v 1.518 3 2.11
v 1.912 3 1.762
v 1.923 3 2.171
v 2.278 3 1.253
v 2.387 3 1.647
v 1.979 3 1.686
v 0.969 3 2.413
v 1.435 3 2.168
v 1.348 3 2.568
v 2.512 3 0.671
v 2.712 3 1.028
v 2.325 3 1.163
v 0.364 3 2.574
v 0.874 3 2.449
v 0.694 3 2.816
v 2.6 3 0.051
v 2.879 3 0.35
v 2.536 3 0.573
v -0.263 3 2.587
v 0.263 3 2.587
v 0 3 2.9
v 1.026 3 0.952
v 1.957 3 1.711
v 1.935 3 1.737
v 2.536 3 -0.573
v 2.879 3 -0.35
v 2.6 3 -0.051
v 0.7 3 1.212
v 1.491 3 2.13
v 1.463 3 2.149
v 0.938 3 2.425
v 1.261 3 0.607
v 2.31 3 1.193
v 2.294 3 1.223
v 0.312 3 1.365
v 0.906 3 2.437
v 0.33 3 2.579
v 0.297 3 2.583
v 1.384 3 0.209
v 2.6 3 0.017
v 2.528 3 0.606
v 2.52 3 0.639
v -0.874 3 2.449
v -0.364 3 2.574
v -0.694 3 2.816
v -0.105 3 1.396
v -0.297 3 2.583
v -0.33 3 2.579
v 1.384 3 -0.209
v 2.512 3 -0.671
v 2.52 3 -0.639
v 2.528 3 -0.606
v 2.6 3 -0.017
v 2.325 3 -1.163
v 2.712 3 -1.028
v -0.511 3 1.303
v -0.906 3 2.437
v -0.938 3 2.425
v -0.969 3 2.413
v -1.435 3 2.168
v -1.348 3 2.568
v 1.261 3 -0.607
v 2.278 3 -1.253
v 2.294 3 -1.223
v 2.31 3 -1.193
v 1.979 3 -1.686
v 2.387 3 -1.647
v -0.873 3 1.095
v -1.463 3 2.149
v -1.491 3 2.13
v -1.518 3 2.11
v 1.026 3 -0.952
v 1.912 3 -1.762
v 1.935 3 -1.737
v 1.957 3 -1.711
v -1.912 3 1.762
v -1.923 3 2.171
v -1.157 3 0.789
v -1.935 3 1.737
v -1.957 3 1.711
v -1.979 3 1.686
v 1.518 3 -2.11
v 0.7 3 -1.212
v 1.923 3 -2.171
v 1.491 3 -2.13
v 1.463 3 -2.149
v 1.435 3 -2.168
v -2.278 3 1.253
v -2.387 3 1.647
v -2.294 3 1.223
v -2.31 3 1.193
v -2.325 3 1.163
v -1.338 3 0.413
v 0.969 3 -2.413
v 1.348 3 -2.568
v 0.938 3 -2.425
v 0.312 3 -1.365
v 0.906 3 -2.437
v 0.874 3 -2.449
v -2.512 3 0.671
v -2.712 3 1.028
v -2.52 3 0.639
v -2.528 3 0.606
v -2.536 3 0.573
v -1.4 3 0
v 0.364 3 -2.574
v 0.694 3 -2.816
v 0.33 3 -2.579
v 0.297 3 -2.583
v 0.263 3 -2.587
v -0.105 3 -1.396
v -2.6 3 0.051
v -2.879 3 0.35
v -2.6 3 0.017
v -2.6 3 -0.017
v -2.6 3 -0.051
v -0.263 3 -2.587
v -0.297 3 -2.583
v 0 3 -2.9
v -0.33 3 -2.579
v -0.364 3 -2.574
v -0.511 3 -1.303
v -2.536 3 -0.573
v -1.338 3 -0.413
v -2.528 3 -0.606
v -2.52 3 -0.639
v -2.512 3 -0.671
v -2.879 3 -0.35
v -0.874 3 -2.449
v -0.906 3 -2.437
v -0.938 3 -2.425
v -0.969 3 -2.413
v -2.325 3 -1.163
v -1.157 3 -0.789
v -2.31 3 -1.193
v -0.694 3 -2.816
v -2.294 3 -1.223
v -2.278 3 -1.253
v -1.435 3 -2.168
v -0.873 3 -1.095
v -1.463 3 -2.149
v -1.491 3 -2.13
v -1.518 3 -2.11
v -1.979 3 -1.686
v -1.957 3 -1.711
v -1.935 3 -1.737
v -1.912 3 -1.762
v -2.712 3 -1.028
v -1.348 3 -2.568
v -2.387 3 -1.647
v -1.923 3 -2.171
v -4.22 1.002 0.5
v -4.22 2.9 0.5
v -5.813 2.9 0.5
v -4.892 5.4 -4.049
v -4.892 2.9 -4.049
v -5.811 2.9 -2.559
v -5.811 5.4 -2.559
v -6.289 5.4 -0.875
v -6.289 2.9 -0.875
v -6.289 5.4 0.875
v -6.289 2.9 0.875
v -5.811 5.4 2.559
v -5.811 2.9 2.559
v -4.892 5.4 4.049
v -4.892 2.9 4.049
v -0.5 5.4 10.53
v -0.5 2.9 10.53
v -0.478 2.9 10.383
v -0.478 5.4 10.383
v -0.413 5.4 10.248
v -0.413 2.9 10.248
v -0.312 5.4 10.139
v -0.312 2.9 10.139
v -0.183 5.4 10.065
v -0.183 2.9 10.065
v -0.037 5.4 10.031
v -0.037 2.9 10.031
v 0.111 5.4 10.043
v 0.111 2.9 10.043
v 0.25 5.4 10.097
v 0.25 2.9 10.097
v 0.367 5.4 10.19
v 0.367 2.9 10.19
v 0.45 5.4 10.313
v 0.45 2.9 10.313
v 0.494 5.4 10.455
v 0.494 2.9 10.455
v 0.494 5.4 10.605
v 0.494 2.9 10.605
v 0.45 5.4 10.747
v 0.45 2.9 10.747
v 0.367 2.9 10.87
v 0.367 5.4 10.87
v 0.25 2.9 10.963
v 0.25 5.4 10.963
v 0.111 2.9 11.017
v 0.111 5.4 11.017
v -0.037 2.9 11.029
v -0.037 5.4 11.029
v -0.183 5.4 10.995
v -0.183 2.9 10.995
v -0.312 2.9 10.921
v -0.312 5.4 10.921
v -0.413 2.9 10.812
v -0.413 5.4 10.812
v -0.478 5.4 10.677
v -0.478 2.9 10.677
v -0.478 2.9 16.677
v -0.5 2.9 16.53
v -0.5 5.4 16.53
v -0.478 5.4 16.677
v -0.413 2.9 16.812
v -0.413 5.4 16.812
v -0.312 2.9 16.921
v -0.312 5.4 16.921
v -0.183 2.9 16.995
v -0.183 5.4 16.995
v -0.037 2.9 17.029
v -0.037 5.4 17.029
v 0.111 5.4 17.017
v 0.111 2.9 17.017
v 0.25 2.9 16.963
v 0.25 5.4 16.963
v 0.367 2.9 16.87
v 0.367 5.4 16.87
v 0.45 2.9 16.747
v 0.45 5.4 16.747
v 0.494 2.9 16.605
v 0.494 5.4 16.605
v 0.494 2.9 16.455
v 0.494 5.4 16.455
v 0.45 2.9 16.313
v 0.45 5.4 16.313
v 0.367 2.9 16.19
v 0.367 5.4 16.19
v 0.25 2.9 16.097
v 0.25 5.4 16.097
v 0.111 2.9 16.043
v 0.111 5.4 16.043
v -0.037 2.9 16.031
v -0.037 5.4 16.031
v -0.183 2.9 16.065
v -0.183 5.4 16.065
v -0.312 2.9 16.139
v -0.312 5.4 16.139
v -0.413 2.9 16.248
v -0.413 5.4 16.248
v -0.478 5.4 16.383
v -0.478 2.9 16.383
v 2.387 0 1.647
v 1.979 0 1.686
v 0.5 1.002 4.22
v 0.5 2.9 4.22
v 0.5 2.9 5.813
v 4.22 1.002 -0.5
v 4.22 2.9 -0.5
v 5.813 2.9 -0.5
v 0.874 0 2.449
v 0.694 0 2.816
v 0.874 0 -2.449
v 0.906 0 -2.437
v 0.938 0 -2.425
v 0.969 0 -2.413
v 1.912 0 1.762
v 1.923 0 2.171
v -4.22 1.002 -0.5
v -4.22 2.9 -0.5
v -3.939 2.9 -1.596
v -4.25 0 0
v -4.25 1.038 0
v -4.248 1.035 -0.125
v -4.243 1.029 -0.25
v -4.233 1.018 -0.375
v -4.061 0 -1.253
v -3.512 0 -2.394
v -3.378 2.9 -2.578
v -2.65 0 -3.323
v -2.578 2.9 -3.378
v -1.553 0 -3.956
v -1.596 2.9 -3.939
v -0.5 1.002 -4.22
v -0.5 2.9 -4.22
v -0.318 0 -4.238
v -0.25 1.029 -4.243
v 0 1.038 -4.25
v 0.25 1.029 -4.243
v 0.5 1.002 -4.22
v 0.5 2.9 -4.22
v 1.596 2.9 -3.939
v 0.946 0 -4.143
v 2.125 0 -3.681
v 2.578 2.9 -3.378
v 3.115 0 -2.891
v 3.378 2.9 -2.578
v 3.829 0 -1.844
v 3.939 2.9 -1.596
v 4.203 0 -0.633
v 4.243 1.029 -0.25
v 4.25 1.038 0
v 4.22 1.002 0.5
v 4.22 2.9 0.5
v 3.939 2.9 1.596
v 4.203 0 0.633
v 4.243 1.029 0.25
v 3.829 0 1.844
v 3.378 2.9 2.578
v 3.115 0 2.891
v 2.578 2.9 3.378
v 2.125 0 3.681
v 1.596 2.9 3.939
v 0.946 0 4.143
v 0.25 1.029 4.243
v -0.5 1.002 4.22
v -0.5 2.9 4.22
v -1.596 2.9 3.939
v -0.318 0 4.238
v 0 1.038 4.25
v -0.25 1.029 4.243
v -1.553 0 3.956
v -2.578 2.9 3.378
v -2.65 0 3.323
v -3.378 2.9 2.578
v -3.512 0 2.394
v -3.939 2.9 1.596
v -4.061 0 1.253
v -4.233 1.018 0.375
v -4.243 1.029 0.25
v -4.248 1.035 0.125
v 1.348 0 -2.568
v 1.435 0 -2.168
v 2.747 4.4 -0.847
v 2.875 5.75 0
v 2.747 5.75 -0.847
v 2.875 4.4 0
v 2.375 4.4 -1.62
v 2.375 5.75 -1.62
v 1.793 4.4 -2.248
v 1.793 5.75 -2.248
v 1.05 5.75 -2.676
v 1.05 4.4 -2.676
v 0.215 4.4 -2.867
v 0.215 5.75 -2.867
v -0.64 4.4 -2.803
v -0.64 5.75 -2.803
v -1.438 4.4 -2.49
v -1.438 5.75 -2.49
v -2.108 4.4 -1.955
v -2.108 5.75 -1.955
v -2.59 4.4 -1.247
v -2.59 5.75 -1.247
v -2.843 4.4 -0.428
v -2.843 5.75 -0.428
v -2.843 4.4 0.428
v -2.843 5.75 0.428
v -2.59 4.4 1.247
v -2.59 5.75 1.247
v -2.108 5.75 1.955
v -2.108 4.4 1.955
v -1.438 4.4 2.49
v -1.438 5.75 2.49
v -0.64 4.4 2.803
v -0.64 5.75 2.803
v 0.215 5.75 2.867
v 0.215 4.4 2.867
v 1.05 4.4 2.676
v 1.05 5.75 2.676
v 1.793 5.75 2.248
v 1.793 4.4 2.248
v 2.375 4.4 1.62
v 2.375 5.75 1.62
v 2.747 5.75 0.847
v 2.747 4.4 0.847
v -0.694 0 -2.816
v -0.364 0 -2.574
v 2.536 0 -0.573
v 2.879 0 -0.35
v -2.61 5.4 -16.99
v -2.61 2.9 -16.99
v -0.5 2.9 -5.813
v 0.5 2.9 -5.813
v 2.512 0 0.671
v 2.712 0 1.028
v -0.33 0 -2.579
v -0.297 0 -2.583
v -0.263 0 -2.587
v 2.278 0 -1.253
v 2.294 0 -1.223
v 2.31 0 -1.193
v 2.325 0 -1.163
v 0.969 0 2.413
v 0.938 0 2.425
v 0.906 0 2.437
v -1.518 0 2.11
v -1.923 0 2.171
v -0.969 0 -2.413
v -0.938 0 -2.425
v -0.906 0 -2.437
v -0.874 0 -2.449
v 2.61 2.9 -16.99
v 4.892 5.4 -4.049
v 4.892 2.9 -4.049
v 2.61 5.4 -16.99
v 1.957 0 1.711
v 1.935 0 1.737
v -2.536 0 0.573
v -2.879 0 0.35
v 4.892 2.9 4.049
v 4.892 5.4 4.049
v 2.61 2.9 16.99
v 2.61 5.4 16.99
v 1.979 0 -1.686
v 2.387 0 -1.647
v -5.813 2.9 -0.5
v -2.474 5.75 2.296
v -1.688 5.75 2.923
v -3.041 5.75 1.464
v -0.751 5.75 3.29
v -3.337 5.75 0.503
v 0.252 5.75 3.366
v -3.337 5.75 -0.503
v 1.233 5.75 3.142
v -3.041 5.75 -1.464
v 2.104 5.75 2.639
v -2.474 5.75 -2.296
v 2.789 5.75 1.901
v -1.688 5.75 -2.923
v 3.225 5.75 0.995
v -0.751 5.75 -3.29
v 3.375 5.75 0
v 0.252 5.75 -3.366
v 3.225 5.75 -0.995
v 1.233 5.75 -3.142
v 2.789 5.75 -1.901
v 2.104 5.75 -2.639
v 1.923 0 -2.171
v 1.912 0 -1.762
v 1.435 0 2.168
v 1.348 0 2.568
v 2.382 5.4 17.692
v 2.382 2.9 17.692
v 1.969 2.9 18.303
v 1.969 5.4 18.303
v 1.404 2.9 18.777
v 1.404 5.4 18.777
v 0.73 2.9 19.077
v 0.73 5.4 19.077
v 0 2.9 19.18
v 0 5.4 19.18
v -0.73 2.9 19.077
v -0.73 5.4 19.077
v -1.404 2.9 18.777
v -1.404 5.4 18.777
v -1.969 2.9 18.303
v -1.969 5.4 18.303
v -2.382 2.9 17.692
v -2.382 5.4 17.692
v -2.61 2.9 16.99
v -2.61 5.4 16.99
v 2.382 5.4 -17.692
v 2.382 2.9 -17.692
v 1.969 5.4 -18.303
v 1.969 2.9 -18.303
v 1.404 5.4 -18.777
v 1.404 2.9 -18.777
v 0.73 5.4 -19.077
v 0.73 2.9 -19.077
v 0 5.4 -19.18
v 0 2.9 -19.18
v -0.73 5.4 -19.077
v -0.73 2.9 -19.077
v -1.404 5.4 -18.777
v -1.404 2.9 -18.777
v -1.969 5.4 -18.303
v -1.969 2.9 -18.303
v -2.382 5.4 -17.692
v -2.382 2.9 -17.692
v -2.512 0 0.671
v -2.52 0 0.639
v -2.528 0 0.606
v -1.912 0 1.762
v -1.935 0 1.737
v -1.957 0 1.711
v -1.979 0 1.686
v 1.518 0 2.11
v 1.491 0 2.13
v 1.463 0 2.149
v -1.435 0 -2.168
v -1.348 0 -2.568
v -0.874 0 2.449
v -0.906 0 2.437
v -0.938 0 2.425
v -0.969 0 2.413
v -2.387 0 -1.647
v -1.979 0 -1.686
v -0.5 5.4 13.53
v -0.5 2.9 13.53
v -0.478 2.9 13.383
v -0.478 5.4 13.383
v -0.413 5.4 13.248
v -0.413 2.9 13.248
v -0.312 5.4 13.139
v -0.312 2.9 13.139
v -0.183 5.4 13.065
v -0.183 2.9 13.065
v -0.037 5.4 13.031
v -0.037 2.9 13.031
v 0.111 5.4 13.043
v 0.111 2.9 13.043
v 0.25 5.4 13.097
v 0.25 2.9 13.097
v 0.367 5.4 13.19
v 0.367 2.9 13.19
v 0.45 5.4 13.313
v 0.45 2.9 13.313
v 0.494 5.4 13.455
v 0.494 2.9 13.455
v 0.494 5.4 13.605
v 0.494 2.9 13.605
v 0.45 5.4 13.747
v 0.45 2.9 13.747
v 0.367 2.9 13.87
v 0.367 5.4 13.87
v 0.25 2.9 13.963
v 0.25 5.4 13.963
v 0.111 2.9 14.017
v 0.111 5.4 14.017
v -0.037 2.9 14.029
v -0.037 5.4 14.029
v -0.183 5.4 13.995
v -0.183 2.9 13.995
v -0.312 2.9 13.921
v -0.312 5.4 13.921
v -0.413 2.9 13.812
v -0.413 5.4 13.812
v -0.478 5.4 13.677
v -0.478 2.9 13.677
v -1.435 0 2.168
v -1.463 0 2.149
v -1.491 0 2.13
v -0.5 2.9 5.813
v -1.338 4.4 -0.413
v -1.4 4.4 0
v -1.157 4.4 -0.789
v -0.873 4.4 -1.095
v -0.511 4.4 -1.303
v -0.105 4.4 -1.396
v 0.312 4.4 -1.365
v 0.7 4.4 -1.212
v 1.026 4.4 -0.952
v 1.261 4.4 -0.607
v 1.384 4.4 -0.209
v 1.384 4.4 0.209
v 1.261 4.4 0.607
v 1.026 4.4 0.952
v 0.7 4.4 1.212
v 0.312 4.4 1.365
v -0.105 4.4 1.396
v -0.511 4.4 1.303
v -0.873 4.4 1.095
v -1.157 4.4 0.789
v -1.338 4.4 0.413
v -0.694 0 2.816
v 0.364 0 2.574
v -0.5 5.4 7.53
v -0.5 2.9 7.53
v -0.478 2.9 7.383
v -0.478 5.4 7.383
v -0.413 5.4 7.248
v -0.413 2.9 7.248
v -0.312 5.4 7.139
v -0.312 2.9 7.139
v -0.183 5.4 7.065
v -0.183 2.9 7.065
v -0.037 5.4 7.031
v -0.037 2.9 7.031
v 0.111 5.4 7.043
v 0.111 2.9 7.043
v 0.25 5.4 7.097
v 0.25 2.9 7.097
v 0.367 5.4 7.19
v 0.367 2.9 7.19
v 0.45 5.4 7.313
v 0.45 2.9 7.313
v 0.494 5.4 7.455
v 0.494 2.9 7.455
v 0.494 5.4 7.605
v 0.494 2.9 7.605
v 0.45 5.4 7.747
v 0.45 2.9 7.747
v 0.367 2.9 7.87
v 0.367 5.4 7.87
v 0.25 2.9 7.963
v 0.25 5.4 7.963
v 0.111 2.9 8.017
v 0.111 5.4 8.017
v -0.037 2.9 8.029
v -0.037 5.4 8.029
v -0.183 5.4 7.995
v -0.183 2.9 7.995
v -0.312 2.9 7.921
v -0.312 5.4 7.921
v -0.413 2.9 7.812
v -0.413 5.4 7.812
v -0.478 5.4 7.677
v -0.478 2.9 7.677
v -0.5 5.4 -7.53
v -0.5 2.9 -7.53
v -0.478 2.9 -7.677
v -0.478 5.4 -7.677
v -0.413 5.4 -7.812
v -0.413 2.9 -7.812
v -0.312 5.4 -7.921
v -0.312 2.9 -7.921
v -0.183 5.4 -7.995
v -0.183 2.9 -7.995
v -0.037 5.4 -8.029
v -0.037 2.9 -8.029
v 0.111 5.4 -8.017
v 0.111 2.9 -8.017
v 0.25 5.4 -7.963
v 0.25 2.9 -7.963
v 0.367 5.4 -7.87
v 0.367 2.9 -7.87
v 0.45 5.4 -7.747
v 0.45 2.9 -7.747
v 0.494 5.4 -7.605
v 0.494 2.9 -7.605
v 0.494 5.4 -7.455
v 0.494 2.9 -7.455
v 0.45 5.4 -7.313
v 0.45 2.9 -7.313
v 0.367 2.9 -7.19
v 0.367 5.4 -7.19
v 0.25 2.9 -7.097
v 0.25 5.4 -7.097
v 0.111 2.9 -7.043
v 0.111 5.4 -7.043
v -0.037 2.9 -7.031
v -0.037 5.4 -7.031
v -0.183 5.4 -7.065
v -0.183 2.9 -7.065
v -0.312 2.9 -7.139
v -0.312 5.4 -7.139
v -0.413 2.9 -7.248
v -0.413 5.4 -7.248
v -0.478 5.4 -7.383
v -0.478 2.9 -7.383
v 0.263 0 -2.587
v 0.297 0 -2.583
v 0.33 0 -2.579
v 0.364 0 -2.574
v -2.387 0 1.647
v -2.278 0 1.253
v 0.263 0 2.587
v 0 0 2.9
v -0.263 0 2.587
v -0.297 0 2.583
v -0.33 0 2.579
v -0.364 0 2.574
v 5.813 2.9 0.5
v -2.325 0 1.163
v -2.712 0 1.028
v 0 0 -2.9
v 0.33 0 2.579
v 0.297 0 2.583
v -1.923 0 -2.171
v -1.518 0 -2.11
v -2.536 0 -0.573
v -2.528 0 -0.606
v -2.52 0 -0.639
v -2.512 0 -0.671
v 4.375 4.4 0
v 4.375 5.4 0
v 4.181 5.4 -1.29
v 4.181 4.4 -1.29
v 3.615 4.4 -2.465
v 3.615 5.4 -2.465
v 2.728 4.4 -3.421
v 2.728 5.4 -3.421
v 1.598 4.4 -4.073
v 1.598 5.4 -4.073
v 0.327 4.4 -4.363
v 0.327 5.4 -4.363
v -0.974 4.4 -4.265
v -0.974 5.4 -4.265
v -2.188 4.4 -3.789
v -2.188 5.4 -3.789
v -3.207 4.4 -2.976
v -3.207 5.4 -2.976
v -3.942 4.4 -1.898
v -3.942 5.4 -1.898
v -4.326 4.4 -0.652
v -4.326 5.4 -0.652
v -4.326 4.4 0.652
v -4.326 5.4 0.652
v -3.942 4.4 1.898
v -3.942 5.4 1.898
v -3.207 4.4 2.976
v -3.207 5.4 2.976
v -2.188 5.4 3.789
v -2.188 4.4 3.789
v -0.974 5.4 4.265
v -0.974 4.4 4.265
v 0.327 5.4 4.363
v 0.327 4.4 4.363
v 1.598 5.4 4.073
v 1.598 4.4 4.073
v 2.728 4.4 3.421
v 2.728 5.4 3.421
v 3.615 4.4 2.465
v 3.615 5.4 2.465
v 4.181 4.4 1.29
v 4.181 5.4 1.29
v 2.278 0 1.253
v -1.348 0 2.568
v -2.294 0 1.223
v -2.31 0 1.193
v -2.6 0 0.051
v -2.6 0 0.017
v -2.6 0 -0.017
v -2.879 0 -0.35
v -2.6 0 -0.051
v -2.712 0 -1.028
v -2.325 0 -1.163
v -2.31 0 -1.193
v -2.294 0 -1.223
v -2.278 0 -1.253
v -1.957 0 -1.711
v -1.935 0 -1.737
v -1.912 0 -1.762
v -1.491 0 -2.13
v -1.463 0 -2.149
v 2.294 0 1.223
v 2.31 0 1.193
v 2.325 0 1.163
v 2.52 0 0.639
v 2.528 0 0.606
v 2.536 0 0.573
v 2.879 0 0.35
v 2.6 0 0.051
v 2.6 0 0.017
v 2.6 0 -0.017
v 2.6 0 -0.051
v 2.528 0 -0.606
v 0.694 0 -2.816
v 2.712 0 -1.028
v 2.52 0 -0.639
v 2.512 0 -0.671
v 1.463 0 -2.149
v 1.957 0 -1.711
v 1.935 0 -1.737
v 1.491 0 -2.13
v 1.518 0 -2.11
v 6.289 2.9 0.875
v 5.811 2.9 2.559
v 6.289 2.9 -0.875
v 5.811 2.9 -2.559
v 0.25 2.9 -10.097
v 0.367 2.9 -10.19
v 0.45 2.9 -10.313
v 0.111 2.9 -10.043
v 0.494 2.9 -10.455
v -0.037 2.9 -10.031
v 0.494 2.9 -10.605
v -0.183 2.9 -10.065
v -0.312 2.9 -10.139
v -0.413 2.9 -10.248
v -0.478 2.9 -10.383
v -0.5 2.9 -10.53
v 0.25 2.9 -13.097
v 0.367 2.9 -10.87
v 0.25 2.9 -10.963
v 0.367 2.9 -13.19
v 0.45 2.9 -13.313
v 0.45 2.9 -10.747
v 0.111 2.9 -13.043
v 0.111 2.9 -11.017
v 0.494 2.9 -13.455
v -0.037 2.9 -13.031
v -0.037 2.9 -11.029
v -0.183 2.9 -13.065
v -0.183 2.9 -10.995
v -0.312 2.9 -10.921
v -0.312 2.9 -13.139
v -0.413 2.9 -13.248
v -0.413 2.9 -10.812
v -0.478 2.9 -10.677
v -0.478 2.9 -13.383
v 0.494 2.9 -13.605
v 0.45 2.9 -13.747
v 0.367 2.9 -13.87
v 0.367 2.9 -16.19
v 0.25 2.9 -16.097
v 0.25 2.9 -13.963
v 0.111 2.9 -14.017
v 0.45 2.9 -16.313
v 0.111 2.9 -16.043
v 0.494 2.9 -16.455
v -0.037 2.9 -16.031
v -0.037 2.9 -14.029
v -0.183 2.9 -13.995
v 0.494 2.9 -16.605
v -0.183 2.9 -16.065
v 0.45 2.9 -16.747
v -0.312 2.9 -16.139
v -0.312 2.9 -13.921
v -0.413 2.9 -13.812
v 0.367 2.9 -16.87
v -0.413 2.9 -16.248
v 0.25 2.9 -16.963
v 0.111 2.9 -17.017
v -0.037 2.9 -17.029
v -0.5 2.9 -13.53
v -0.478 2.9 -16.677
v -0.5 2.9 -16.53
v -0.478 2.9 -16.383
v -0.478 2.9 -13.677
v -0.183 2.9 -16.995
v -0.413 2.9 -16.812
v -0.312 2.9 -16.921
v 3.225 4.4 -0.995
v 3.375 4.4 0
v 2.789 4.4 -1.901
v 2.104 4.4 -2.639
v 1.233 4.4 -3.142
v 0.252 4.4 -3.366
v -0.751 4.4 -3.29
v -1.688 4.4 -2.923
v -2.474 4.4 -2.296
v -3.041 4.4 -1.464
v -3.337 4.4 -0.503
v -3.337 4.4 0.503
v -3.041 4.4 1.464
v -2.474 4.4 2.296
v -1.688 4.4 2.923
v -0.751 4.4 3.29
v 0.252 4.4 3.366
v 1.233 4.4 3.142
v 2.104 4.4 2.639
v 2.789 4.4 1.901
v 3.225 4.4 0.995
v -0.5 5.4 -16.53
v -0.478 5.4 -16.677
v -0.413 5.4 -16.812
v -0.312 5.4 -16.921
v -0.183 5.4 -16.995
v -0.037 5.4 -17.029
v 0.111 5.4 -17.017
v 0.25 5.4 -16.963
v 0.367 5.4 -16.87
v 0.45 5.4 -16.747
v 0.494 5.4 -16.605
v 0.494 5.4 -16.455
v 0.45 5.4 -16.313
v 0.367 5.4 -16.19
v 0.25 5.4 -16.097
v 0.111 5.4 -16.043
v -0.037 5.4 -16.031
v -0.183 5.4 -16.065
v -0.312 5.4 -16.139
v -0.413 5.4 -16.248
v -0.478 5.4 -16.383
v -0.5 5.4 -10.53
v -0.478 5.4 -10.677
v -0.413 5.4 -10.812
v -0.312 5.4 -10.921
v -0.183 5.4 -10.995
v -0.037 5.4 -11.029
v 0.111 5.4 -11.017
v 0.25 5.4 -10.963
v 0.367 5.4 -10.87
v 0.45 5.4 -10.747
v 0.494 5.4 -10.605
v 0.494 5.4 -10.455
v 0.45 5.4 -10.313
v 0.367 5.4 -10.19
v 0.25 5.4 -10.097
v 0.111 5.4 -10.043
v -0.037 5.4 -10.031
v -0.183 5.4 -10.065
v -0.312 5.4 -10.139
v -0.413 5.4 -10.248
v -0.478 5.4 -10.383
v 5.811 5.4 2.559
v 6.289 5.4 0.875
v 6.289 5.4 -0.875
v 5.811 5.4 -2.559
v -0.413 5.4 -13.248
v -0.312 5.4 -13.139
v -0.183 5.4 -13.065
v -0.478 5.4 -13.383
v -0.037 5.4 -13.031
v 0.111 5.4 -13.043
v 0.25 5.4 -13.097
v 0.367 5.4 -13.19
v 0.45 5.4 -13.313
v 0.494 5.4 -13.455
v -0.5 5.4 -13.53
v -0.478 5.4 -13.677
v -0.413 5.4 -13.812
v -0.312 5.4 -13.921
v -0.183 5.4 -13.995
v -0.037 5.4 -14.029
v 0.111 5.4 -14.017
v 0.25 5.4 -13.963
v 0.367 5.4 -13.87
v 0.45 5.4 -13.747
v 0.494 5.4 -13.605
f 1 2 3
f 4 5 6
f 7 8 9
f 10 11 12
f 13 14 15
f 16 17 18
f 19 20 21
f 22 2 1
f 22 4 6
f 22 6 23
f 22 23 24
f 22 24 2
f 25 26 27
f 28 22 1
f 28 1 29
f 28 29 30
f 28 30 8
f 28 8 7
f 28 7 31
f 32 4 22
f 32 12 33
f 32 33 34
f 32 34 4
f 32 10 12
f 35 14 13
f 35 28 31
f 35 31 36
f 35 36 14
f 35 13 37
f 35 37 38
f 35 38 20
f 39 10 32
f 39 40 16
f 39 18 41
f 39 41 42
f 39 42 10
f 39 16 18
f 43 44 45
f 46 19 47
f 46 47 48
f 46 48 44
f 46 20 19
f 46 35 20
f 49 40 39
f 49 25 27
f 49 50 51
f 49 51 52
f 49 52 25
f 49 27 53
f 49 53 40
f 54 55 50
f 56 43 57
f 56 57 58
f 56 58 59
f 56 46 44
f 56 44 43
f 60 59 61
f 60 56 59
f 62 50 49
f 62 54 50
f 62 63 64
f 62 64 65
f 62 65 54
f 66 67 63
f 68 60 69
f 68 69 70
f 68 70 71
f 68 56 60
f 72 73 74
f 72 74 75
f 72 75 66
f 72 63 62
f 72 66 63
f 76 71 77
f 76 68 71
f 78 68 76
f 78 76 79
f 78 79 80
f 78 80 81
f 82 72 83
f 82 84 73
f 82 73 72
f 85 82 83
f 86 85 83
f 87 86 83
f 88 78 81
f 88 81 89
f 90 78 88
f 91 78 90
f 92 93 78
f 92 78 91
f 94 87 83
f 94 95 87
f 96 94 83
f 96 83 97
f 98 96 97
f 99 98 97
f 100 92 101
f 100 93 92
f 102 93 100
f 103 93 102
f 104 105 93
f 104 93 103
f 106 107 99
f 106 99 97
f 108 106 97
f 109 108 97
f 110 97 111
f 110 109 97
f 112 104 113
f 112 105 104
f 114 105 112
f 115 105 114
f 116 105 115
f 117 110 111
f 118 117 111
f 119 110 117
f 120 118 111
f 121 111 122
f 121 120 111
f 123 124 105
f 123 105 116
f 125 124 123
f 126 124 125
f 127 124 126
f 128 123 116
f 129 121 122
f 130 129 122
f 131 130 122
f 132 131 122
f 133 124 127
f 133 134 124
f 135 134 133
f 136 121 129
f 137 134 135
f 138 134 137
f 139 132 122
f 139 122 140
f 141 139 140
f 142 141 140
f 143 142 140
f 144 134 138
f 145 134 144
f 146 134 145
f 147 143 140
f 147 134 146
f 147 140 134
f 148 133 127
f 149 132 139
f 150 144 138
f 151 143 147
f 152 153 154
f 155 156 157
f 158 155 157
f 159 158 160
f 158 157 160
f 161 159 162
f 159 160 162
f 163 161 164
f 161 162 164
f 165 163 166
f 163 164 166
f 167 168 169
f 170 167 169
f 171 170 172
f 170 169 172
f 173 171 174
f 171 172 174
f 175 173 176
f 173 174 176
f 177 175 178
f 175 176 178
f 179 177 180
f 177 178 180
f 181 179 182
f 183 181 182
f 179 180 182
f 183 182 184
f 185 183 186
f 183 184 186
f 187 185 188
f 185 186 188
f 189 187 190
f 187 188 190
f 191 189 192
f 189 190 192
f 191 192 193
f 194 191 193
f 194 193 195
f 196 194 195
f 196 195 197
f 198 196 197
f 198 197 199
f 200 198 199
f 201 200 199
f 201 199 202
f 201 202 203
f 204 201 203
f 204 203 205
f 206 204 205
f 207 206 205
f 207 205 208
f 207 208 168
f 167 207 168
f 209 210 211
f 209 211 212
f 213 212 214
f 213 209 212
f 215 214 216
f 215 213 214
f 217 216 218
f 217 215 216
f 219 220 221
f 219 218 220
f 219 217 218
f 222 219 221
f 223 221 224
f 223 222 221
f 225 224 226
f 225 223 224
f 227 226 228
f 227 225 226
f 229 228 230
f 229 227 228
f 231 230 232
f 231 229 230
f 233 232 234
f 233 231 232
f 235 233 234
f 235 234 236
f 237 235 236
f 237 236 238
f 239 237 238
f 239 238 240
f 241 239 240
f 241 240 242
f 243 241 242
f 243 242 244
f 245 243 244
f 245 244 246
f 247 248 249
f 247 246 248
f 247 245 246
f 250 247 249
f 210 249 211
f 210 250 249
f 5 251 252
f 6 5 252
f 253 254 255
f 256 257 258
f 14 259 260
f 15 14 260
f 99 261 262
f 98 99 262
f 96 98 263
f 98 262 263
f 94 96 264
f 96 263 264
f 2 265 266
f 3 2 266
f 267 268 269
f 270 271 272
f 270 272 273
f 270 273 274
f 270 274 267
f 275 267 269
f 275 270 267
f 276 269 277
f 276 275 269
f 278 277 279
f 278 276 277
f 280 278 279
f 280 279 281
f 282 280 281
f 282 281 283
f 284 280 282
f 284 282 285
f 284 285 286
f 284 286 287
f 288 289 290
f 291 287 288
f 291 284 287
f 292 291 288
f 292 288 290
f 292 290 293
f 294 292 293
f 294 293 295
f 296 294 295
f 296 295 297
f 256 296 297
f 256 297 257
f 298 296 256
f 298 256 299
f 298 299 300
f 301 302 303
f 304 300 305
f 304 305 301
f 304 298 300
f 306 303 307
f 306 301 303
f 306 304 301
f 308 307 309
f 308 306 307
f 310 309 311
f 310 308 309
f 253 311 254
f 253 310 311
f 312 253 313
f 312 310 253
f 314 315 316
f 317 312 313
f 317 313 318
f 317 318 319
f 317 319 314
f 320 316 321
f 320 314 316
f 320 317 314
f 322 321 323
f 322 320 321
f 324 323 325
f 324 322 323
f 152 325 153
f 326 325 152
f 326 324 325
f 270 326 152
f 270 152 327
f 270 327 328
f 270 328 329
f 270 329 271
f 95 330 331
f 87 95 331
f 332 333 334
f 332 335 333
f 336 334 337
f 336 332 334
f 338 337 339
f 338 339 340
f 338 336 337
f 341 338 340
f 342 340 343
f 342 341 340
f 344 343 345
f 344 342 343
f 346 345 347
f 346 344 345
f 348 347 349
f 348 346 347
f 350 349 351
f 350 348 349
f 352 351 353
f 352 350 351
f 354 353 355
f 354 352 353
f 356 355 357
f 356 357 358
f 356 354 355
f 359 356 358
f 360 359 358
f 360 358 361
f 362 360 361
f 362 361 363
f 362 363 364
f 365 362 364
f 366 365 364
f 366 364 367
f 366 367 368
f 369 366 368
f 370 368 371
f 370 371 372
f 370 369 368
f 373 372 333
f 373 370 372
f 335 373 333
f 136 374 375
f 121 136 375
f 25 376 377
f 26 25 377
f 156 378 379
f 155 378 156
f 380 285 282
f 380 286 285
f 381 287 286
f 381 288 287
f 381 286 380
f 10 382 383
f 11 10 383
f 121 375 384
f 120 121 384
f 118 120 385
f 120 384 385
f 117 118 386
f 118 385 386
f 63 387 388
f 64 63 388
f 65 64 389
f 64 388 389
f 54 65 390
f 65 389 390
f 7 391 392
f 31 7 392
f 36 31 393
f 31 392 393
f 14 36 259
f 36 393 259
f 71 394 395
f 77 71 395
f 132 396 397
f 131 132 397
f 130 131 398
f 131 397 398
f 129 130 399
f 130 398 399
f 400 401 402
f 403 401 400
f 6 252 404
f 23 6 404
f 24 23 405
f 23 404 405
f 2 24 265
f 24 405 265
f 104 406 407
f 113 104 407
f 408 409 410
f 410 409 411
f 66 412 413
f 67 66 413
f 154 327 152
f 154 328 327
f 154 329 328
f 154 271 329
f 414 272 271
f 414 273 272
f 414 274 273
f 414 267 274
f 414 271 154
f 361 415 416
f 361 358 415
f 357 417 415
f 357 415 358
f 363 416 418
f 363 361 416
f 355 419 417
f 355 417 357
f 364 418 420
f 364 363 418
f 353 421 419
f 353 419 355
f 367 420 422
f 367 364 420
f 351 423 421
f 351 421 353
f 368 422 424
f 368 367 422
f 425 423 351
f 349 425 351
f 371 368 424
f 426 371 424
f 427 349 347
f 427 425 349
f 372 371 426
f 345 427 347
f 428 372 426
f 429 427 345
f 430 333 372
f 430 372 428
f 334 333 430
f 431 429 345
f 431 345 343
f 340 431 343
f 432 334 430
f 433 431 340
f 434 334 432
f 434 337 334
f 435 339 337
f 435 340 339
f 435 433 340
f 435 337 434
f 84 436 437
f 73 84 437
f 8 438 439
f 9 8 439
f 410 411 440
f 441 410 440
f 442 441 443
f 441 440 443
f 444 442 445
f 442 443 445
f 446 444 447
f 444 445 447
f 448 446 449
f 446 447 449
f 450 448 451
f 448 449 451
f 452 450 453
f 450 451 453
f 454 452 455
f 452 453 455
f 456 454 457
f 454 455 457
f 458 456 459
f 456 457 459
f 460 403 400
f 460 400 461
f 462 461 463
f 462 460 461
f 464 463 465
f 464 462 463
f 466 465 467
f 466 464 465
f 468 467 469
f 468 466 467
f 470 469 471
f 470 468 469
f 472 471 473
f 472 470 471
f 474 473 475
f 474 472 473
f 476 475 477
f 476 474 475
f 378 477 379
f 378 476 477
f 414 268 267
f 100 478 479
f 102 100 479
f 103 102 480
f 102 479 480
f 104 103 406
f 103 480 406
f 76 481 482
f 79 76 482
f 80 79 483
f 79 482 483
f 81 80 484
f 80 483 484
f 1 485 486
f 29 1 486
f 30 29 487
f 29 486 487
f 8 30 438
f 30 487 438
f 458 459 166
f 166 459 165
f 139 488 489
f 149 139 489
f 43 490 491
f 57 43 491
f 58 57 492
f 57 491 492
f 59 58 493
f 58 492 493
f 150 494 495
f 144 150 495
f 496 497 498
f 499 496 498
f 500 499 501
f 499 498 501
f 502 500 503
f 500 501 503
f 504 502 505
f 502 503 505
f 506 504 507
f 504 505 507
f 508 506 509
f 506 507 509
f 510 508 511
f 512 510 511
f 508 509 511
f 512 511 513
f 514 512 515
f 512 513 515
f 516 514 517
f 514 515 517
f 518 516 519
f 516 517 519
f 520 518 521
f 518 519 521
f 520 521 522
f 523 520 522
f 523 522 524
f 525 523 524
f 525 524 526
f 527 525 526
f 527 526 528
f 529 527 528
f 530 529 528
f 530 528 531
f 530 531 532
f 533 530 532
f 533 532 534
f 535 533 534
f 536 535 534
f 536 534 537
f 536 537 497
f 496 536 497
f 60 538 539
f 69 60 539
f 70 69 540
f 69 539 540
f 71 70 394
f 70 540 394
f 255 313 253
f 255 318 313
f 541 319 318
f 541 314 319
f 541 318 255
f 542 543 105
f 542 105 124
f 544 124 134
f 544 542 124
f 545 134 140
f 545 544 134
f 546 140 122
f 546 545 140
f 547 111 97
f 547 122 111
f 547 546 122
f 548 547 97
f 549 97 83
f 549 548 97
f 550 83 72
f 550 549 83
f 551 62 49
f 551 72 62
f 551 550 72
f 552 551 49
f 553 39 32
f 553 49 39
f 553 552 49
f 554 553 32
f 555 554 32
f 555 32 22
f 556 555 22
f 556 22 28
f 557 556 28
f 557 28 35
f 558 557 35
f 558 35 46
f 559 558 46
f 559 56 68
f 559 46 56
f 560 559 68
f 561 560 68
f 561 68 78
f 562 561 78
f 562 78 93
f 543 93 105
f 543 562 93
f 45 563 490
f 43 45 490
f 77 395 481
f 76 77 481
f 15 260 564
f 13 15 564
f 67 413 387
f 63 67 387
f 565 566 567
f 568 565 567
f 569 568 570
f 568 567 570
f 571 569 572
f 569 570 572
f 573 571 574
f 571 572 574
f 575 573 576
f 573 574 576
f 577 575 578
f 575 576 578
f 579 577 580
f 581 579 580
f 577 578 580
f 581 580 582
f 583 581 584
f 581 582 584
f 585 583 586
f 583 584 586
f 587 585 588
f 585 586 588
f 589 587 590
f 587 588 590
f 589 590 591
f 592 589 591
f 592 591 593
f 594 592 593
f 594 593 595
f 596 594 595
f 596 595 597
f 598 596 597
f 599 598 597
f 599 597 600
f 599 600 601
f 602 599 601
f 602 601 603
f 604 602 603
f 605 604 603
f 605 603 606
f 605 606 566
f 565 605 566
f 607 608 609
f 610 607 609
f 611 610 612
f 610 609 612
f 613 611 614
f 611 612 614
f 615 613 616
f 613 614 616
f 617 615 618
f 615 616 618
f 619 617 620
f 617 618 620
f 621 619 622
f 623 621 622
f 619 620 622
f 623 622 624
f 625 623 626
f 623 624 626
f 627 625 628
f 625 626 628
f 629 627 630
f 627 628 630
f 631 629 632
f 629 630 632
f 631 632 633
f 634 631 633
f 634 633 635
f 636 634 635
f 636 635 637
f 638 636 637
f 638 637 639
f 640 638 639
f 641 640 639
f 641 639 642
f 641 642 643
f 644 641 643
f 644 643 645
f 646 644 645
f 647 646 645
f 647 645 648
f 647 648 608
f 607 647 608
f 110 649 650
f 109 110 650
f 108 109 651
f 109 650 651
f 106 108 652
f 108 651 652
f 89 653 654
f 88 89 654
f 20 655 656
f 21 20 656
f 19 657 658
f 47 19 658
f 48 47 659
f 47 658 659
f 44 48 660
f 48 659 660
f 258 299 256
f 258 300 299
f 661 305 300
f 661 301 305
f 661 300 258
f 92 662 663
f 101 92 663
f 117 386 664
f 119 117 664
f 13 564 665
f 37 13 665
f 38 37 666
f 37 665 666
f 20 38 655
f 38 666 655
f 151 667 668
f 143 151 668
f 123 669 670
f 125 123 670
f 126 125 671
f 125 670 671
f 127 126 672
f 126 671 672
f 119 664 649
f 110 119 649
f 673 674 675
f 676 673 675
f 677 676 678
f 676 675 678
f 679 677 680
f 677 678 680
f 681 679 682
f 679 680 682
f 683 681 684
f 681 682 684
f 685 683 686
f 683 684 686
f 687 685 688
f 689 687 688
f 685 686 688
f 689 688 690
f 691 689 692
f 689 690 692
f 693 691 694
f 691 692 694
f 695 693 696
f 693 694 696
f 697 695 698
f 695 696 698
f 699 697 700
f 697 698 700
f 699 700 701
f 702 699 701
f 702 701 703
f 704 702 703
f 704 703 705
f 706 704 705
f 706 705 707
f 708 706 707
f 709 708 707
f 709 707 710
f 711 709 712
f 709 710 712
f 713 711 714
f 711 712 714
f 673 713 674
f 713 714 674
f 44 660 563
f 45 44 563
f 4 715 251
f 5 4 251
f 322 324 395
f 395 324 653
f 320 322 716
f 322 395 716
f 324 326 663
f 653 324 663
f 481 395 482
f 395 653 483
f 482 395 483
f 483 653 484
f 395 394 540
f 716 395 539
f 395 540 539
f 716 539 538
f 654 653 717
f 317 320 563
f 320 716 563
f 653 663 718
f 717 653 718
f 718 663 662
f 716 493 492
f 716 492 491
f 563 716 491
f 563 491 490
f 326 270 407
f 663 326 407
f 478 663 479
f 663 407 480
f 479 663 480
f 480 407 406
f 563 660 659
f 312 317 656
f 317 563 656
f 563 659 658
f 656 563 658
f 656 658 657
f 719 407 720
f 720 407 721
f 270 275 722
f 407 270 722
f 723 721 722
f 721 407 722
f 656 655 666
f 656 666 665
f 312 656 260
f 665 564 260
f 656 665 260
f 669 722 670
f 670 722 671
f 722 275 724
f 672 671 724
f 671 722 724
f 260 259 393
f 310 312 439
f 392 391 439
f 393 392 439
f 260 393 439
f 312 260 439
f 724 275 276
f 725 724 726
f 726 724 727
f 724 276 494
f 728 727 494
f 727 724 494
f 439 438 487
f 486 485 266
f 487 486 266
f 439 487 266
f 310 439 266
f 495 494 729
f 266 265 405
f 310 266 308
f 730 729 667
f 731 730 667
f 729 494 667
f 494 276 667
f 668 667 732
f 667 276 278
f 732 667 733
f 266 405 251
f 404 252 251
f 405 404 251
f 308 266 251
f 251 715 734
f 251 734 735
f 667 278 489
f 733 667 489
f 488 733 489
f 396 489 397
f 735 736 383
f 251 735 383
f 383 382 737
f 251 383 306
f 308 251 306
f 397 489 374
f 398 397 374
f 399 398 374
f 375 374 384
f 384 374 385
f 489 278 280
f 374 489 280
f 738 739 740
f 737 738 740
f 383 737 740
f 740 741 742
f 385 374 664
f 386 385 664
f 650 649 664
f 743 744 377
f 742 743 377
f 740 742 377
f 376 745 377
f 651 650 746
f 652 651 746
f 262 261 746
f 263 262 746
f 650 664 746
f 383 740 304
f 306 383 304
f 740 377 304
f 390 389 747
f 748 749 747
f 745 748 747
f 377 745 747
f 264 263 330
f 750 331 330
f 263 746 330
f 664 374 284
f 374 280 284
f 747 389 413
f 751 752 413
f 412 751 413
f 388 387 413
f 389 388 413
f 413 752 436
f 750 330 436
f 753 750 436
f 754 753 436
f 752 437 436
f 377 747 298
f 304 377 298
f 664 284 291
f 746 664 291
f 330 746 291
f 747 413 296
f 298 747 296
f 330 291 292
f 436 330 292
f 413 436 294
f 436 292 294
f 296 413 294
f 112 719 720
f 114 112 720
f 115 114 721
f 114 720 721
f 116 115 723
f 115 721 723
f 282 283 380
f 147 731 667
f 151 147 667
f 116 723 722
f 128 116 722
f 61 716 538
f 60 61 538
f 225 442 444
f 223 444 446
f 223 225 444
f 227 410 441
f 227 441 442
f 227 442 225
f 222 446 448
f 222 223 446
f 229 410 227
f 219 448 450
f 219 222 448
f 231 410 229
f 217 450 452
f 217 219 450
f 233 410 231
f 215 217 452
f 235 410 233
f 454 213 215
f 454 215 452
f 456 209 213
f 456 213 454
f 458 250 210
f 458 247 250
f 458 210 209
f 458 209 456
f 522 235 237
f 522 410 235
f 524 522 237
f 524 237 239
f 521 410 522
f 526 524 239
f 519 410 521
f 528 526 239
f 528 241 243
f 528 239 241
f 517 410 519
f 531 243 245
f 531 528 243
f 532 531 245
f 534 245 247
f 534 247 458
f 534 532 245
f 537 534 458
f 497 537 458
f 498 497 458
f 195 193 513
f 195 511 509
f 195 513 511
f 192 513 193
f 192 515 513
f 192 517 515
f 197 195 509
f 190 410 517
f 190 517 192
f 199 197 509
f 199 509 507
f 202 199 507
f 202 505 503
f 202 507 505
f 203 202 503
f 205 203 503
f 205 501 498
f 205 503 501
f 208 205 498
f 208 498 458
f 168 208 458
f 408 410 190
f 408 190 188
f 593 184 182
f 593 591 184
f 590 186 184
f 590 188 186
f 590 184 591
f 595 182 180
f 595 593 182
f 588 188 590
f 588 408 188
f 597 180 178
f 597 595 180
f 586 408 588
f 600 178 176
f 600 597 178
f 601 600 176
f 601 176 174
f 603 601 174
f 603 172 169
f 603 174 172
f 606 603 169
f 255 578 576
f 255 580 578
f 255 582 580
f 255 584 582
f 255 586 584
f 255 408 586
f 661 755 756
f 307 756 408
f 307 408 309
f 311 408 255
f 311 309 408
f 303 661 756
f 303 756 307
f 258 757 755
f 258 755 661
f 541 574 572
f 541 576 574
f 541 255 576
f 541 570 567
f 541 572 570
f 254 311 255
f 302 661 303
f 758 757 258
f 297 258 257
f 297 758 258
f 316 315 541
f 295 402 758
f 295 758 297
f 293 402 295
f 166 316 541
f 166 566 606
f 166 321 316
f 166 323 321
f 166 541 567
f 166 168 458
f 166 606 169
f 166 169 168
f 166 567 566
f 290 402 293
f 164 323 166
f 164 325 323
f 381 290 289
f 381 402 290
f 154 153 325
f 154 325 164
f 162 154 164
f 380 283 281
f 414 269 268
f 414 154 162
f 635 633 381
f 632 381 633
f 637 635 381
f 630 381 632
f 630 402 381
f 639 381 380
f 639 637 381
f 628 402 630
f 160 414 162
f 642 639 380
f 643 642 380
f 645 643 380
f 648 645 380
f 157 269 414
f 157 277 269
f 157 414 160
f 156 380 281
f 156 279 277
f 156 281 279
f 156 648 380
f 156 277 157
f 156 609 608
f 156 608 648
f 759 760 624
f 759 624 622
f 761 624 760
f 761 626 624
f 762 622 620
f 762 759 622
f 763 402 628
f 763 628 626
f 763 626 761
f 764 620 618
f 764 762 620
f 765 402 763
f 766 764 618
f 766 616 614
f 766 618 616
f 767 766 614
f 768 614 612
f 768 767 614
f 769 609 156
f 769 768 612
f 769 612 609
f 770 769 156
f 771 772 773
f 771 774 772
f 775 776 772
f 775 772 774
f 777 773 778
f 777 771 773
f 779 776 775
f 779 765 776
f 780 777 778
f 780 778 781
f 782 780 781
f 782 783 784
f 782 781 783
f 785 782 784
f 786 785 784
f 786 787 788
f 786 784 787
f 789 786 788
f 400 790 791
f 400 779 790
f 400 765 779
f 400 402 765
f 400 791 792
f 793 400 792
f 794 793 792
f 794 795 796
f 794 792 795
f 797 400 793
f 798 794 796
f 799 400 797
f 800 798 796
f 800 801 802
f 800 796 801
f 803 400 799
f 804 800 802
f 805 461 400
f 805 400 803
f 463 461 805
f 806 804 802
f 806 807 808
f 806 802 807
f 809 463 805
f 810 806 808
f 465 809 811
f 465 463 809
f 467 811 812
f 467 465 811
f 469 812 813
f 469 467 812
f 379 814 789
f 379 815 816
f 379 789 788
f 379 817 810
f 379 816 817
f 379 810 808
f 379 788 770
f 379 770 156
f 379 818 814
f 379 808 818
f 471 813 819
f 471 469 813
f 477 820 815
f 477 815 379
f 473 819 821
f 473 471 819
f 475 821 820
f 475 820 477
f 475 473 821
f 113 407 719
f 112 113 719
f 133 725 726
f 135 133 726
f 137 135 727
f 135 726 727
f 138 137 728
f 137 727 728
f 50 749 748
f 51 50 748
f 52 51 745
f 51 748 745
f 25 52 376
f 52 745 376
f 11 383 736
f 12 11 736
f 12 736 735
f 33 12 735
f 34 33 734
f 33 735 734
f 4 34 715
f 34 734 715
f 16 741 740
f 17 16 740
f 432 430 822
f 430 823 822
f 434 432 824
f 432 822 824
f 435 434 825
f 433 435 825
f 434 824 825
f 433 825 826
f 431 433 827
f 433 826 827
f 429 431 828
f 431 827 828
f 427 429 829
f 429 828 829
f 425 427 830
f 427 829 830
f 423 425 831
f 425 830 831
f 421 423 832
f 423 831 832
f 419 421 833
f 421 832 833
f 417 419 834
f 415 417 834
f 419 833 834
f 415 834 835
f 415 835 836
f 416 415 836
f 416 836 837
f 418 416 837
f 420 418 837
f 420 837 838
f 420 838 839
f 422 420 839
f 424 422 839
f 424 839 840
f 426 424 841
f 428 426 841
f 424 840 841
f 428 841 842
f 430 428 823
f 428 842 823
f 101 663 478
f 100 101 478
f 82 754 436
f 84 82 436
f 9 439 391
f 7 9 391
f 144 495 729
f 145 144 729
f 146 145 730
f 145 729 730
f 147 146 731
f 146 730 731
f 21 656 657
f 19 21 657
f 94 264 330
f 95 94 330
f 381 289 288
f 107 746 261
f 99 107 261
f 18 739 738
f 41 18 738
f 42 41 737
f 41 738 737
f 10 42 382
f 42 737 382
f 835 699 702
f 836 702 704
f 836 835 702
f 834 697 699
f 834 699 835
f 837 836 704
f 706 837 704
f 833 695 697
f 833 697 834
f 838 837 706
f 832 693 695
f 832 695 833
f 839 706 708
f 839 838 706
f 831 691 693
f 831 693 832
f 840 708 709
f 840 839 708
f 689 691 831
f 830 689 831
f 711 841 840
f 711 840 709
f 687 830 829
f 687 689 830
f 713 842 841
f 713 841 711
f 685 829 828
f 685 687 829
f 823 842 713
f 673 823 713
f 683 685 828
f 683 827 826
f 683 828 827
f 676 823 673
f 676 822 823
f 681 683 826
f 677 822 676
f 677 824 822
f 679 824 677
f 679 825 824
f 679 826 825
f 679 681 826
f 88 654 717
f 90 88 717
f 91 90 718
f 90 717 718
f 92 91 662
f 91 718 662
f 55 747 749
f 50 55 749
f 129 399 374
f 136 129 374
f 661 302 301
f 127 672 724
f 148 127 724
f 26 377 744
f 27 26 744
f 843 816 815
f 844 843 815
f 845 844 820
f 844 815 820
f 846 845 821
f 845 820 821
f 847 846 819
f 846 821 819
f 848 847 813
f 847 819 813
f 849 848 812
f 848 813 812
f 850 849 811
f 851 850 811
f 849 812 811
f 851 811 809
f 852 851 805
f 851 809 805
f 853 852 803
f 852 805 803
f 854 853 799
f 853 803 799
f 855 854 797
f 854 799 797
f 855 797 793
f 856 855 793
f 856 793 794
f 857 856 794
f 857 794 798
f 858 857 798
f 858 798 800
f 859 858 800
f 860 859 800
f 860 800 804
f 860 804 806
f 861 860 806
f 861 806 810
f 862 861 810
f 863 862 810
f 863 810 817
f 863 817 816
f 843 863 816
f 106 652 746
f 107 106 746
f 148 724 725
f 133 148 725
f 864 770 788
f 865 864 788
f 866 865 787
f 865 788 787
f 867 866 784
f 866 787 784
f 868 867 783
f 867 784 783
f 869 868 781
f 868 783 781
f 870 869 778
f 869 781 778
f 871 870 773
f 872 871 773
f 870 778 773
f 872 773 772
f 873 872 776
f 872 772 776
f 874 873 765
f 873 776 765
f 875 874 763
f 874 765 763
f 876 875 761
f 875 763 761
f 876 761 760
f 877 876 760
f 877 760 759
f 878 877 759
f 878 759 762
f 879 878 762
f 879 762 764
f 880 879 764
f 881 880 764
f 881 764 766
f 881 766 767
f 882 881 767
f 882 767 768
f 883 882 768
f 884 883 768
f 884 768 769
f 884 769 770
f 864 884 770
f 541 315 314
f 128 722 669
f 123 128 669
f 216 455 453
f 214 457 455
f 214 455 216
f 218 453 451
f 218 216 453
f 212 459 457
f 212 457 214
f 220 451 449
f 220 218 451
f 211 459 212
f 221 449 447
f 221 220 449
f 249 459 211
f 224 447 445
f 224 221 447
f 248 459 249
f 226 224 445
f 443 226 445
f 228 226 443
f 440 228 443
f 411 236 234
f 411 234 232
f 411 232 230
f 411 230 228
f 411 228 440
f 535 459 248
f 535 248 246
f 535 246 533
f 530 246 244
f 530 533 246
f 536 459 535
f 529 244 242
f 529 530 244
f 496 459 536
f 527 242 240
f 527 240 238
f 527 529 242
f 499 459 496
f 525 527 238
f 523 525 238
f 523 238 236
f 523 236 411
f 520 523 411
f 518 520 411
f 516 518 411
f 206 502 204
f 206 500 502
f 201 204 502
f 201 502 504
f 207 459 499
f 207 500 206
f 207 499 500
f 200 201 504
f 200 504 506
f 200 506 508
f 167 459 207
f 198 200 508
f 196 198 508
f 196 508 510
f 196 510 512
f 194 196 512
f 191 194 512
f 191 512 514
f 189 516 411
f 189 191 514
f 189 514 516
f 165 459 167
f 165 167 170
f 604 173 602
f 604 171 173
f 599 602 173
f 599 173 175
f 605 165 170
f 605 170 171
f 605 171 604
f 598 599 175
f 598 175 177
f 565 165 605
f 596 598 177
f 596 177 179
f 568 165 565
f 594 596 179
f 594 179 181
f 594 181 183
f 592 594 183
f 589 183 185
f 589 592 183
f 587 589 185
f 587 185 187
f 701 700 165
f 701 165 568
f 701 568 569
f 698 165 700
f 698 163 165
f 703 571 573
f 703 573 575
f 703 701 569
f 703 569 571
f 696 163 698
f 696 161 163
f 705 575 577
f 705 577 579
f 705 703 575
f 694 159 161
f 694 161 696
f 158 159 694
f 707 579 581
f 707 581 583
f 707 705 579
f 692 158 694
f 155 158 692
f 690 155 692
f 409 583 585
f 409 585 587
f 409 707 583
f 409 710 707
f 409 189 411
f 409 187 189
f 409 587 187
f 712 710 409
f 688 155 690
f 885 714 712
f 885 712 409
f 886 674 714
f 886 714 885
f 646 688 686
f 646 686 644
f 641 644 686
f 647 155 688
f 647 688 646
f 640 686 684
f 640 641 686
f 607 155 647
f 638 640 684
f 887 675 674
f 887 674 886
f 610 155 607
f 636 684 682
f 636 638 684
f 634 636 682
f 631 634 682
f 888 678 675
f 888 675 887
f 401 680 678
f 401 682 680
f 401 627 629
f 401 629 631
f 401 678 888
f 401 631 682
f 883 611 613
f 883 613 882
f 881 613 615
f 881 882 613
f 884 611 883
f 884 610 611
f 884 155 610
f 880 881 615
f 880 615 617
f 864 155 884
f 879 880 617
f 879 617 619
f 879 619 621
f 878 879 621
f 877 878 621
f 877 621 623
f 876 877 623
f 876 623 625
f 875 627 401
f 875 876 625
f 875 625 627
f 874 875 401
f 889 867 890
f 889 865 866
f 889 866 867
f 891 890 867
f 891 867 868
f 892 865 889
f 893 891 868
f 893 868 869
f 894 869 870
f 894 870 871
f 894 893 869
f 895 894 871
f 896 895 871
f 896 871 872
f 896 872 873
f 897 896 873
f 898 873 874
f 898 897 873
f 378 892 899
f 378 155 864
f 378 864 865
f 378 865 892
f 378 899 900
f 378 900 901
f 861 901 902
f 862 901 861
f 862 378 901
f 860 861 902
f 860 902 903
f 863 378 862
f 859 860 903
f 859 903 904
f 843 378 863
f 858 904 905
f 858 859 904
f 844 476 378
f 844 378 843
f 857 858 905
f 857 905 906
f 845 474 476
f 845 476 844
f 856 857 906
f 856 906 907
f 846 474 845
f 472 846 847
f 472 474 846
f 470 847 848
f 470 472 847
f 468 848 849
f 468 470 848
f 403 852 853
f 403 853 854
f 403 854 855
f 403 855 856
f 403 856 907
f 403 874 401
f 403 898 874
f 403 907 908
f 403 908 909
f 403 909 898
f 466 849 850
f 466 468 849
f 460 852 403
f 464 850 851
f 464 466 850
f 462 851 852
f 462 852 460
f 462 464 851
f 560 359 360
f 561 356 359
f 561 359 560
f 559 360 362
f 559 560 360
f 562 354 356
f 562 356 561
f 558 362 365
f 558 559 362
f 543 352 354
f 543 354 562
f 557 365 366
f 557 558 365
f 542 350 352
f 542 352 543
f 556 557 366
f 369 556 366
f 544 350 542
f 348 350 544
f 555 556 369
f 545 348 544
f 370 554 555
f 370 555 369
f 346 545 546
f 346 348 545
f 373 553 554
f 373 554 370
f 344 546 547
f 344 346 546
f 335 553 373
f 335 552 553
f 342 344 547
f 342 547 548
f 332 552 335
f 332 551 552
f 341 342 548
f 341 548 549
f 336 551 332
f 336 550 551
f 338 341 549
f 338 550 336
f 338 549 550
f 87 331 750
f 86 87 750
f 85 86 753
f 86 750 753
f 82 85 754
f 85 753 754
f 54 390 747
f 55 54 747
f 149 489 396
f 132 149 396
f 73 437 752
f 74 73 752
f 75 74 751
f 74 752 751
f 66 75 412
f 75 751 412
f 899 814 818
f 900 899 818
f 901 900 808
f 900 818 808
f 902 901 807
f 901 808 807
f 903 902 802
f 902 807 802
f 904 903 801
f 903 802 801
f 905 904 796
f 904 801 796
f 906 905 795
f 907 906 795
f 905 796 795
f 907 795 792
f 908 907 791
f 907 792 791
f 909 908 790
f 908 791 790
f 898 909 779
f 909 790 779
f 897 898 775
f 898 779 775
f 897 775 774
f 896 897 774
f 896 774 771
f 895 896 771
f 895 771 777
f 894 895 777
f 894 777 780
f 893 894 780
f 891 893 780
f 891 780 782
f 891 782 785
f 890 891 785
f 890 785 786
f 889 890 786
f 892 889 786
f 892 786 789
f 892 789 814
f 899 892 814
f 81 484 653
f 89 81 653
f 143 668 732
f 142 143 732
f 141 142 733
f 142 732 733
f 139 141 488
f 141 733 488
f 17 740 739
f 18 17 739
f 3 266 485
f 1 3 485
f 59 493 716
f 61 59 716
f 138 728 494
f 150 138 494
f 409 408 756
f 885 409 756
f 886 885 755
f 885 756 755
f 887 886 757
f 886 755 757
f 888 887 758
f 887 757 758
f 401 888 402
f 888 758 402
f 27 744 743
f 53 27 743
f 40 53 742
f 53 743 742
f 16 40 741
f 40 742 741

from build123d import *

# Parameters (mm, degrees)
SKETCH1_R               = 6.35
BOSS_EXTRUDE1_DEPTH     = 5.4
HORN_DEPTH              = 2.5
SKETCH4_R               = 1.4
CUT_EXTRUDE1_DEPTH      = 6.4
SKETCH5_R               = 0.5
CUT_EXTRUDE2_DEPTH      = 6.4
LPATTERN1_COUNT         = 4
LPATTERN1_PITCH         = 3
MIRROR1_COPY_1_SKETCH_R = 0.5
MIRROR1_COPY_1_DEPTH    = 6.4
MIRROR1_COPY_2_SKETCH_R = 0.5
MIRROR1_COPY_2_DEPTH    = 6.4
MIRROR1_COPY_3_SKETCH_R = 0.5
MIRROR1_COPY_3_DEPTH    = 6.4
CUT_EXTRUDE4_DEPTH      = 3
CIRPATTERN2_COUNT       = 26
SKETCH9_R               = 2.6
CUT_EXTRUDE5_DEPTH      = 3
SKETCH10_R              = 6.35
SKETCH10_R_2            = 4.25
CUT_EXTRUDE6_DEPTH      = 2.9
BOSS_EXTRUDE5_DEPTH     = 0.5
CIRPATTERN3_COUNT       = 4
SKETCH12_R              = 4.375
CUT_EXTRUDE7_DEPTH      = 1
SKETCH13_R              = 3.375
SKETCH13_R_2            = 2.875
BOSS_EXTRUDE6_DEPTH     = 1
SKETCH14_R              = 3.375
SKETCH14_R_2            = 2.875
BOSS_EXTRUDE7_DEPTH     = 0.35


with BuildPart() as part:
    # Sketch1 → Boss-Extrude1 (new body)
    with BuildSketch(Plane(origin=(0, 0, 0), x_dir=(1, 0, 0), z_dir=(0, 1, 0))):
        Circle(SKETCH1_R)
    extrude(amount=BOSS_EXTRUDE1_DEPTH)

    # Sketch2 → horn (add)
    with BuildSketch(Plane(origin=(0, 5.4, 0), x_dir=(1, 0, 0), z_dir=(0, 1, 0))):
        with BuildLine():
            Line((-2.609740545, 16.990167671), (-4.891612682, 4.049027706))
            ThreePointArc((-4.891612682, 4.049027706), (0, 6.35), (4.891612682, 4.049027706))
            Line((4.891612682, 4.049027706), (2.609740545, 16.990167671))
            ThreePointArc((2.609740545, 16.990167671), (0, 19.18), (-2.609740545, 16.990167671))
        make_face()
    horn = extrude(amount=-HORN_DEPTH)

    # Sketch4 → Cut-Extrude1 (cut, through all)
    with BuildSketch(Plane(origin=(0, 5.4, 0), x_dir=(-1, 0, 0), z_dir=(0, -1, 0))):
        Circle(SKETCH4_R)
    extrude(amount=CUT_EXTRUDE1_DEPTH, mode=Mode.SUBTRACT)

    # Sketch5 → Cut-Extrude2 (cut, through all)
    with BuildSketch(Plane(origin=(0, 0, 0), x_dir=(-1, 0, 0), z_dir=(0, -1, 0))):
        with Locations((0, 16.53)):
            Circle(SKETCH5_R)
    cut_extrude2 = extrude(amount=-CUT_EXTRUDE2_DEPTH, mode=Mode.SUBTRACT)

    # LPattern1: Cut-Extrude2 ×4
    with Locations(*[(0, 0, i * LPATTERN1_PITCH) for i in range(1, LPATTERN1_COUNT)]):
        add(cut_extrude2, mode=Mode.SUBTRACT)

    # Mirror1: horn, Cut-Extrude2 across plane
    add(horn.mirror(Plane.XY))
    add(cut_extrude2.mirror(Plane.XY), mode=Mode.SUBTRACT)

    # Mirror1 copy 1 sketch → Mirror1 copy 1 (cut, through all)
    with BuildSketch(Plane(origin=(0, 0, -3), x_dir=(-1, 0, 0), z_dir=(0, -1, 0))):
        with Locations((0, -16.53)):
            Circle(MIRROR1_COPY_1_SKETCH_R)
    extrude(amount=-MIRROR1_COPY_1_DEPTH, mode=Mode.SUBTRACT)

    # Mirror1 copy 2 sketch → Mirror1 copy 2 (cut, through all)
    with BuildSketch(Plane(origin=(0, 0, -6), x_dir=(-1, 0, 0), z_dir=(0, -1, 0))):
        with Locations((0, -16.53)):
            Circle(MIRROR1_COPY_2_SKETCH_R)
    extrude(amount=-MIRROR1_COPY_2_DEPTH, mode=Mode.SUBTRACT)

    # Mirror1 copy 3 sketch → Mirror1 copy 3 (cut, through all)
    with BuildSketch(Plane(origin=(0, 0, -9), x_dir=(-1, 0, 0), z_dir=(0, -1, 0))):
        with Locations((0, -16.53)):
            Circle(MIRROR1_COPY_3_SKETCH_R)
    extrude(amount=-MIRROR1_COPY_3_DEPTH, mode=Mode.SUBTRACT)

    # Sketch8 → Cut-Extrude4 (cut)
    with BuildSketch(Plane(origin=(0, 0, 0), x_dir=(-1, 0, 0), z_dir=(0, -1, 0))):
        with BuildLine():
            Line((0, -2.9), (0.262912611, -2.586672952))
            ThreePointArc((0.262912611, -2.586672952), (0, -2.6), (-0.262912611, -2.586672952))
            Line((-0.262912611, -2.586672952), (0, -2.9))
        make_face()
    cut_extrude4 = extrude(amount=-CUT_EXTRUDE4_DEPTH, mode=Mode.SUBTRACT)

    # CirPattern2: Cut-Extrude4 ×26 about axis
    cirpattern2_axis = Axis((0, 0, 0), (0, 1, 0))
    for i in range(1, CIRPATTERN2_COUNT):
        add(cut_extrude4.rotate(cirpattern2_axis, i * 360 / CIRPATTERN2_COUNT), mode=Mode.SUBTRACT)

    # Sketch9 → Cut-Extrude5 (cut)
    with BuildSketch(Plane(origin=(0, 0, 0), x_dir=(-1, 0, 0), z_dir=(0, -1, 0))):
        Circle(SKETCH9_R)
    extrude(amount=-CUT_EXTRUDE5_DEPTH, mode=Mode.SUBTRACT)

    # Sketch10 → Cut-Extrude6 (cut)
    with BuildSketch(Plane(origin=(0, 0, 0), x_dir=(-1, 0, 0), z_dir=(0, -1, 0))):
        Circle(SKETCH10_R)
        Circle(SKETCH10_R_2, mode=Mode.SUBTRACT)
    extrude(amount=-CUT_EXTRUDE6_DEPTH, mode=Mode.SUBTRACT)

    # Sketch11 → Boss-Extrude5 (add, symmetric)
    with BuildSketch(Plane.XY):
        Polygon((4.21, 0.99), (5.812680296, 2.9), (4.21, 2.9), (4.16, 2.9), (4.16, 0.99), align=None)
    boss_extrude5 = extrude(amount=BOSS_EXTRUDE5_DEPTH, both=True)

    # CirPattern3: Boss-Extrude5 ×4 about axis
    cirpattern3_axis = Axis((0, 0, 0), (0, 1, 0))
    for i in range(1, CIRPATTERN3_COUNT):
        add(boss_extrude5.rotate(cirpattern3_axis, i * 360 / CIRPATTERN3_COUNT))

    # Sketch12 → Cut-Extrude7 (cut)
    with BuildSketch(Plane(origin=(0, 5.4, 0), x_dir=(1, 0, 0), z_dir=(0, 1, 0))):
        Circle(SKETCH12_R)
    extrude(amount=-CUT_EXTRUDE7_DEPTH, mode=Mode.SUBTRACT)

    # Sketch13 → Boss-Extrude6 (add)
    with BuildSketch(Plane(origin=(0, 4.4, 0), x_dir=(1, 0, 0), z_dir=(0, 1, 0))):
        Circle(SKETCH13_R)
        Circle(SKETCH13_R_2, mode=Mode.SUBTRACT)
    extrude(amount=BOSS_EXTRUDE6_DEPTH)

    # Sketch14 → Boss-Extrude7 (add)
    with BuildSketch(Plane(origin=(0, 5.4, 0), x_dir=(1, 0, 0), z_dir=(0, 1, 0))):
        Circle(SKETCH14_R)
        Circle(SKETCH14_R_2, mode=Mode.SUBTRACT)
    extrude(amount=BOSS_EXTRUDE7_DEPTH)


solid = part.part
